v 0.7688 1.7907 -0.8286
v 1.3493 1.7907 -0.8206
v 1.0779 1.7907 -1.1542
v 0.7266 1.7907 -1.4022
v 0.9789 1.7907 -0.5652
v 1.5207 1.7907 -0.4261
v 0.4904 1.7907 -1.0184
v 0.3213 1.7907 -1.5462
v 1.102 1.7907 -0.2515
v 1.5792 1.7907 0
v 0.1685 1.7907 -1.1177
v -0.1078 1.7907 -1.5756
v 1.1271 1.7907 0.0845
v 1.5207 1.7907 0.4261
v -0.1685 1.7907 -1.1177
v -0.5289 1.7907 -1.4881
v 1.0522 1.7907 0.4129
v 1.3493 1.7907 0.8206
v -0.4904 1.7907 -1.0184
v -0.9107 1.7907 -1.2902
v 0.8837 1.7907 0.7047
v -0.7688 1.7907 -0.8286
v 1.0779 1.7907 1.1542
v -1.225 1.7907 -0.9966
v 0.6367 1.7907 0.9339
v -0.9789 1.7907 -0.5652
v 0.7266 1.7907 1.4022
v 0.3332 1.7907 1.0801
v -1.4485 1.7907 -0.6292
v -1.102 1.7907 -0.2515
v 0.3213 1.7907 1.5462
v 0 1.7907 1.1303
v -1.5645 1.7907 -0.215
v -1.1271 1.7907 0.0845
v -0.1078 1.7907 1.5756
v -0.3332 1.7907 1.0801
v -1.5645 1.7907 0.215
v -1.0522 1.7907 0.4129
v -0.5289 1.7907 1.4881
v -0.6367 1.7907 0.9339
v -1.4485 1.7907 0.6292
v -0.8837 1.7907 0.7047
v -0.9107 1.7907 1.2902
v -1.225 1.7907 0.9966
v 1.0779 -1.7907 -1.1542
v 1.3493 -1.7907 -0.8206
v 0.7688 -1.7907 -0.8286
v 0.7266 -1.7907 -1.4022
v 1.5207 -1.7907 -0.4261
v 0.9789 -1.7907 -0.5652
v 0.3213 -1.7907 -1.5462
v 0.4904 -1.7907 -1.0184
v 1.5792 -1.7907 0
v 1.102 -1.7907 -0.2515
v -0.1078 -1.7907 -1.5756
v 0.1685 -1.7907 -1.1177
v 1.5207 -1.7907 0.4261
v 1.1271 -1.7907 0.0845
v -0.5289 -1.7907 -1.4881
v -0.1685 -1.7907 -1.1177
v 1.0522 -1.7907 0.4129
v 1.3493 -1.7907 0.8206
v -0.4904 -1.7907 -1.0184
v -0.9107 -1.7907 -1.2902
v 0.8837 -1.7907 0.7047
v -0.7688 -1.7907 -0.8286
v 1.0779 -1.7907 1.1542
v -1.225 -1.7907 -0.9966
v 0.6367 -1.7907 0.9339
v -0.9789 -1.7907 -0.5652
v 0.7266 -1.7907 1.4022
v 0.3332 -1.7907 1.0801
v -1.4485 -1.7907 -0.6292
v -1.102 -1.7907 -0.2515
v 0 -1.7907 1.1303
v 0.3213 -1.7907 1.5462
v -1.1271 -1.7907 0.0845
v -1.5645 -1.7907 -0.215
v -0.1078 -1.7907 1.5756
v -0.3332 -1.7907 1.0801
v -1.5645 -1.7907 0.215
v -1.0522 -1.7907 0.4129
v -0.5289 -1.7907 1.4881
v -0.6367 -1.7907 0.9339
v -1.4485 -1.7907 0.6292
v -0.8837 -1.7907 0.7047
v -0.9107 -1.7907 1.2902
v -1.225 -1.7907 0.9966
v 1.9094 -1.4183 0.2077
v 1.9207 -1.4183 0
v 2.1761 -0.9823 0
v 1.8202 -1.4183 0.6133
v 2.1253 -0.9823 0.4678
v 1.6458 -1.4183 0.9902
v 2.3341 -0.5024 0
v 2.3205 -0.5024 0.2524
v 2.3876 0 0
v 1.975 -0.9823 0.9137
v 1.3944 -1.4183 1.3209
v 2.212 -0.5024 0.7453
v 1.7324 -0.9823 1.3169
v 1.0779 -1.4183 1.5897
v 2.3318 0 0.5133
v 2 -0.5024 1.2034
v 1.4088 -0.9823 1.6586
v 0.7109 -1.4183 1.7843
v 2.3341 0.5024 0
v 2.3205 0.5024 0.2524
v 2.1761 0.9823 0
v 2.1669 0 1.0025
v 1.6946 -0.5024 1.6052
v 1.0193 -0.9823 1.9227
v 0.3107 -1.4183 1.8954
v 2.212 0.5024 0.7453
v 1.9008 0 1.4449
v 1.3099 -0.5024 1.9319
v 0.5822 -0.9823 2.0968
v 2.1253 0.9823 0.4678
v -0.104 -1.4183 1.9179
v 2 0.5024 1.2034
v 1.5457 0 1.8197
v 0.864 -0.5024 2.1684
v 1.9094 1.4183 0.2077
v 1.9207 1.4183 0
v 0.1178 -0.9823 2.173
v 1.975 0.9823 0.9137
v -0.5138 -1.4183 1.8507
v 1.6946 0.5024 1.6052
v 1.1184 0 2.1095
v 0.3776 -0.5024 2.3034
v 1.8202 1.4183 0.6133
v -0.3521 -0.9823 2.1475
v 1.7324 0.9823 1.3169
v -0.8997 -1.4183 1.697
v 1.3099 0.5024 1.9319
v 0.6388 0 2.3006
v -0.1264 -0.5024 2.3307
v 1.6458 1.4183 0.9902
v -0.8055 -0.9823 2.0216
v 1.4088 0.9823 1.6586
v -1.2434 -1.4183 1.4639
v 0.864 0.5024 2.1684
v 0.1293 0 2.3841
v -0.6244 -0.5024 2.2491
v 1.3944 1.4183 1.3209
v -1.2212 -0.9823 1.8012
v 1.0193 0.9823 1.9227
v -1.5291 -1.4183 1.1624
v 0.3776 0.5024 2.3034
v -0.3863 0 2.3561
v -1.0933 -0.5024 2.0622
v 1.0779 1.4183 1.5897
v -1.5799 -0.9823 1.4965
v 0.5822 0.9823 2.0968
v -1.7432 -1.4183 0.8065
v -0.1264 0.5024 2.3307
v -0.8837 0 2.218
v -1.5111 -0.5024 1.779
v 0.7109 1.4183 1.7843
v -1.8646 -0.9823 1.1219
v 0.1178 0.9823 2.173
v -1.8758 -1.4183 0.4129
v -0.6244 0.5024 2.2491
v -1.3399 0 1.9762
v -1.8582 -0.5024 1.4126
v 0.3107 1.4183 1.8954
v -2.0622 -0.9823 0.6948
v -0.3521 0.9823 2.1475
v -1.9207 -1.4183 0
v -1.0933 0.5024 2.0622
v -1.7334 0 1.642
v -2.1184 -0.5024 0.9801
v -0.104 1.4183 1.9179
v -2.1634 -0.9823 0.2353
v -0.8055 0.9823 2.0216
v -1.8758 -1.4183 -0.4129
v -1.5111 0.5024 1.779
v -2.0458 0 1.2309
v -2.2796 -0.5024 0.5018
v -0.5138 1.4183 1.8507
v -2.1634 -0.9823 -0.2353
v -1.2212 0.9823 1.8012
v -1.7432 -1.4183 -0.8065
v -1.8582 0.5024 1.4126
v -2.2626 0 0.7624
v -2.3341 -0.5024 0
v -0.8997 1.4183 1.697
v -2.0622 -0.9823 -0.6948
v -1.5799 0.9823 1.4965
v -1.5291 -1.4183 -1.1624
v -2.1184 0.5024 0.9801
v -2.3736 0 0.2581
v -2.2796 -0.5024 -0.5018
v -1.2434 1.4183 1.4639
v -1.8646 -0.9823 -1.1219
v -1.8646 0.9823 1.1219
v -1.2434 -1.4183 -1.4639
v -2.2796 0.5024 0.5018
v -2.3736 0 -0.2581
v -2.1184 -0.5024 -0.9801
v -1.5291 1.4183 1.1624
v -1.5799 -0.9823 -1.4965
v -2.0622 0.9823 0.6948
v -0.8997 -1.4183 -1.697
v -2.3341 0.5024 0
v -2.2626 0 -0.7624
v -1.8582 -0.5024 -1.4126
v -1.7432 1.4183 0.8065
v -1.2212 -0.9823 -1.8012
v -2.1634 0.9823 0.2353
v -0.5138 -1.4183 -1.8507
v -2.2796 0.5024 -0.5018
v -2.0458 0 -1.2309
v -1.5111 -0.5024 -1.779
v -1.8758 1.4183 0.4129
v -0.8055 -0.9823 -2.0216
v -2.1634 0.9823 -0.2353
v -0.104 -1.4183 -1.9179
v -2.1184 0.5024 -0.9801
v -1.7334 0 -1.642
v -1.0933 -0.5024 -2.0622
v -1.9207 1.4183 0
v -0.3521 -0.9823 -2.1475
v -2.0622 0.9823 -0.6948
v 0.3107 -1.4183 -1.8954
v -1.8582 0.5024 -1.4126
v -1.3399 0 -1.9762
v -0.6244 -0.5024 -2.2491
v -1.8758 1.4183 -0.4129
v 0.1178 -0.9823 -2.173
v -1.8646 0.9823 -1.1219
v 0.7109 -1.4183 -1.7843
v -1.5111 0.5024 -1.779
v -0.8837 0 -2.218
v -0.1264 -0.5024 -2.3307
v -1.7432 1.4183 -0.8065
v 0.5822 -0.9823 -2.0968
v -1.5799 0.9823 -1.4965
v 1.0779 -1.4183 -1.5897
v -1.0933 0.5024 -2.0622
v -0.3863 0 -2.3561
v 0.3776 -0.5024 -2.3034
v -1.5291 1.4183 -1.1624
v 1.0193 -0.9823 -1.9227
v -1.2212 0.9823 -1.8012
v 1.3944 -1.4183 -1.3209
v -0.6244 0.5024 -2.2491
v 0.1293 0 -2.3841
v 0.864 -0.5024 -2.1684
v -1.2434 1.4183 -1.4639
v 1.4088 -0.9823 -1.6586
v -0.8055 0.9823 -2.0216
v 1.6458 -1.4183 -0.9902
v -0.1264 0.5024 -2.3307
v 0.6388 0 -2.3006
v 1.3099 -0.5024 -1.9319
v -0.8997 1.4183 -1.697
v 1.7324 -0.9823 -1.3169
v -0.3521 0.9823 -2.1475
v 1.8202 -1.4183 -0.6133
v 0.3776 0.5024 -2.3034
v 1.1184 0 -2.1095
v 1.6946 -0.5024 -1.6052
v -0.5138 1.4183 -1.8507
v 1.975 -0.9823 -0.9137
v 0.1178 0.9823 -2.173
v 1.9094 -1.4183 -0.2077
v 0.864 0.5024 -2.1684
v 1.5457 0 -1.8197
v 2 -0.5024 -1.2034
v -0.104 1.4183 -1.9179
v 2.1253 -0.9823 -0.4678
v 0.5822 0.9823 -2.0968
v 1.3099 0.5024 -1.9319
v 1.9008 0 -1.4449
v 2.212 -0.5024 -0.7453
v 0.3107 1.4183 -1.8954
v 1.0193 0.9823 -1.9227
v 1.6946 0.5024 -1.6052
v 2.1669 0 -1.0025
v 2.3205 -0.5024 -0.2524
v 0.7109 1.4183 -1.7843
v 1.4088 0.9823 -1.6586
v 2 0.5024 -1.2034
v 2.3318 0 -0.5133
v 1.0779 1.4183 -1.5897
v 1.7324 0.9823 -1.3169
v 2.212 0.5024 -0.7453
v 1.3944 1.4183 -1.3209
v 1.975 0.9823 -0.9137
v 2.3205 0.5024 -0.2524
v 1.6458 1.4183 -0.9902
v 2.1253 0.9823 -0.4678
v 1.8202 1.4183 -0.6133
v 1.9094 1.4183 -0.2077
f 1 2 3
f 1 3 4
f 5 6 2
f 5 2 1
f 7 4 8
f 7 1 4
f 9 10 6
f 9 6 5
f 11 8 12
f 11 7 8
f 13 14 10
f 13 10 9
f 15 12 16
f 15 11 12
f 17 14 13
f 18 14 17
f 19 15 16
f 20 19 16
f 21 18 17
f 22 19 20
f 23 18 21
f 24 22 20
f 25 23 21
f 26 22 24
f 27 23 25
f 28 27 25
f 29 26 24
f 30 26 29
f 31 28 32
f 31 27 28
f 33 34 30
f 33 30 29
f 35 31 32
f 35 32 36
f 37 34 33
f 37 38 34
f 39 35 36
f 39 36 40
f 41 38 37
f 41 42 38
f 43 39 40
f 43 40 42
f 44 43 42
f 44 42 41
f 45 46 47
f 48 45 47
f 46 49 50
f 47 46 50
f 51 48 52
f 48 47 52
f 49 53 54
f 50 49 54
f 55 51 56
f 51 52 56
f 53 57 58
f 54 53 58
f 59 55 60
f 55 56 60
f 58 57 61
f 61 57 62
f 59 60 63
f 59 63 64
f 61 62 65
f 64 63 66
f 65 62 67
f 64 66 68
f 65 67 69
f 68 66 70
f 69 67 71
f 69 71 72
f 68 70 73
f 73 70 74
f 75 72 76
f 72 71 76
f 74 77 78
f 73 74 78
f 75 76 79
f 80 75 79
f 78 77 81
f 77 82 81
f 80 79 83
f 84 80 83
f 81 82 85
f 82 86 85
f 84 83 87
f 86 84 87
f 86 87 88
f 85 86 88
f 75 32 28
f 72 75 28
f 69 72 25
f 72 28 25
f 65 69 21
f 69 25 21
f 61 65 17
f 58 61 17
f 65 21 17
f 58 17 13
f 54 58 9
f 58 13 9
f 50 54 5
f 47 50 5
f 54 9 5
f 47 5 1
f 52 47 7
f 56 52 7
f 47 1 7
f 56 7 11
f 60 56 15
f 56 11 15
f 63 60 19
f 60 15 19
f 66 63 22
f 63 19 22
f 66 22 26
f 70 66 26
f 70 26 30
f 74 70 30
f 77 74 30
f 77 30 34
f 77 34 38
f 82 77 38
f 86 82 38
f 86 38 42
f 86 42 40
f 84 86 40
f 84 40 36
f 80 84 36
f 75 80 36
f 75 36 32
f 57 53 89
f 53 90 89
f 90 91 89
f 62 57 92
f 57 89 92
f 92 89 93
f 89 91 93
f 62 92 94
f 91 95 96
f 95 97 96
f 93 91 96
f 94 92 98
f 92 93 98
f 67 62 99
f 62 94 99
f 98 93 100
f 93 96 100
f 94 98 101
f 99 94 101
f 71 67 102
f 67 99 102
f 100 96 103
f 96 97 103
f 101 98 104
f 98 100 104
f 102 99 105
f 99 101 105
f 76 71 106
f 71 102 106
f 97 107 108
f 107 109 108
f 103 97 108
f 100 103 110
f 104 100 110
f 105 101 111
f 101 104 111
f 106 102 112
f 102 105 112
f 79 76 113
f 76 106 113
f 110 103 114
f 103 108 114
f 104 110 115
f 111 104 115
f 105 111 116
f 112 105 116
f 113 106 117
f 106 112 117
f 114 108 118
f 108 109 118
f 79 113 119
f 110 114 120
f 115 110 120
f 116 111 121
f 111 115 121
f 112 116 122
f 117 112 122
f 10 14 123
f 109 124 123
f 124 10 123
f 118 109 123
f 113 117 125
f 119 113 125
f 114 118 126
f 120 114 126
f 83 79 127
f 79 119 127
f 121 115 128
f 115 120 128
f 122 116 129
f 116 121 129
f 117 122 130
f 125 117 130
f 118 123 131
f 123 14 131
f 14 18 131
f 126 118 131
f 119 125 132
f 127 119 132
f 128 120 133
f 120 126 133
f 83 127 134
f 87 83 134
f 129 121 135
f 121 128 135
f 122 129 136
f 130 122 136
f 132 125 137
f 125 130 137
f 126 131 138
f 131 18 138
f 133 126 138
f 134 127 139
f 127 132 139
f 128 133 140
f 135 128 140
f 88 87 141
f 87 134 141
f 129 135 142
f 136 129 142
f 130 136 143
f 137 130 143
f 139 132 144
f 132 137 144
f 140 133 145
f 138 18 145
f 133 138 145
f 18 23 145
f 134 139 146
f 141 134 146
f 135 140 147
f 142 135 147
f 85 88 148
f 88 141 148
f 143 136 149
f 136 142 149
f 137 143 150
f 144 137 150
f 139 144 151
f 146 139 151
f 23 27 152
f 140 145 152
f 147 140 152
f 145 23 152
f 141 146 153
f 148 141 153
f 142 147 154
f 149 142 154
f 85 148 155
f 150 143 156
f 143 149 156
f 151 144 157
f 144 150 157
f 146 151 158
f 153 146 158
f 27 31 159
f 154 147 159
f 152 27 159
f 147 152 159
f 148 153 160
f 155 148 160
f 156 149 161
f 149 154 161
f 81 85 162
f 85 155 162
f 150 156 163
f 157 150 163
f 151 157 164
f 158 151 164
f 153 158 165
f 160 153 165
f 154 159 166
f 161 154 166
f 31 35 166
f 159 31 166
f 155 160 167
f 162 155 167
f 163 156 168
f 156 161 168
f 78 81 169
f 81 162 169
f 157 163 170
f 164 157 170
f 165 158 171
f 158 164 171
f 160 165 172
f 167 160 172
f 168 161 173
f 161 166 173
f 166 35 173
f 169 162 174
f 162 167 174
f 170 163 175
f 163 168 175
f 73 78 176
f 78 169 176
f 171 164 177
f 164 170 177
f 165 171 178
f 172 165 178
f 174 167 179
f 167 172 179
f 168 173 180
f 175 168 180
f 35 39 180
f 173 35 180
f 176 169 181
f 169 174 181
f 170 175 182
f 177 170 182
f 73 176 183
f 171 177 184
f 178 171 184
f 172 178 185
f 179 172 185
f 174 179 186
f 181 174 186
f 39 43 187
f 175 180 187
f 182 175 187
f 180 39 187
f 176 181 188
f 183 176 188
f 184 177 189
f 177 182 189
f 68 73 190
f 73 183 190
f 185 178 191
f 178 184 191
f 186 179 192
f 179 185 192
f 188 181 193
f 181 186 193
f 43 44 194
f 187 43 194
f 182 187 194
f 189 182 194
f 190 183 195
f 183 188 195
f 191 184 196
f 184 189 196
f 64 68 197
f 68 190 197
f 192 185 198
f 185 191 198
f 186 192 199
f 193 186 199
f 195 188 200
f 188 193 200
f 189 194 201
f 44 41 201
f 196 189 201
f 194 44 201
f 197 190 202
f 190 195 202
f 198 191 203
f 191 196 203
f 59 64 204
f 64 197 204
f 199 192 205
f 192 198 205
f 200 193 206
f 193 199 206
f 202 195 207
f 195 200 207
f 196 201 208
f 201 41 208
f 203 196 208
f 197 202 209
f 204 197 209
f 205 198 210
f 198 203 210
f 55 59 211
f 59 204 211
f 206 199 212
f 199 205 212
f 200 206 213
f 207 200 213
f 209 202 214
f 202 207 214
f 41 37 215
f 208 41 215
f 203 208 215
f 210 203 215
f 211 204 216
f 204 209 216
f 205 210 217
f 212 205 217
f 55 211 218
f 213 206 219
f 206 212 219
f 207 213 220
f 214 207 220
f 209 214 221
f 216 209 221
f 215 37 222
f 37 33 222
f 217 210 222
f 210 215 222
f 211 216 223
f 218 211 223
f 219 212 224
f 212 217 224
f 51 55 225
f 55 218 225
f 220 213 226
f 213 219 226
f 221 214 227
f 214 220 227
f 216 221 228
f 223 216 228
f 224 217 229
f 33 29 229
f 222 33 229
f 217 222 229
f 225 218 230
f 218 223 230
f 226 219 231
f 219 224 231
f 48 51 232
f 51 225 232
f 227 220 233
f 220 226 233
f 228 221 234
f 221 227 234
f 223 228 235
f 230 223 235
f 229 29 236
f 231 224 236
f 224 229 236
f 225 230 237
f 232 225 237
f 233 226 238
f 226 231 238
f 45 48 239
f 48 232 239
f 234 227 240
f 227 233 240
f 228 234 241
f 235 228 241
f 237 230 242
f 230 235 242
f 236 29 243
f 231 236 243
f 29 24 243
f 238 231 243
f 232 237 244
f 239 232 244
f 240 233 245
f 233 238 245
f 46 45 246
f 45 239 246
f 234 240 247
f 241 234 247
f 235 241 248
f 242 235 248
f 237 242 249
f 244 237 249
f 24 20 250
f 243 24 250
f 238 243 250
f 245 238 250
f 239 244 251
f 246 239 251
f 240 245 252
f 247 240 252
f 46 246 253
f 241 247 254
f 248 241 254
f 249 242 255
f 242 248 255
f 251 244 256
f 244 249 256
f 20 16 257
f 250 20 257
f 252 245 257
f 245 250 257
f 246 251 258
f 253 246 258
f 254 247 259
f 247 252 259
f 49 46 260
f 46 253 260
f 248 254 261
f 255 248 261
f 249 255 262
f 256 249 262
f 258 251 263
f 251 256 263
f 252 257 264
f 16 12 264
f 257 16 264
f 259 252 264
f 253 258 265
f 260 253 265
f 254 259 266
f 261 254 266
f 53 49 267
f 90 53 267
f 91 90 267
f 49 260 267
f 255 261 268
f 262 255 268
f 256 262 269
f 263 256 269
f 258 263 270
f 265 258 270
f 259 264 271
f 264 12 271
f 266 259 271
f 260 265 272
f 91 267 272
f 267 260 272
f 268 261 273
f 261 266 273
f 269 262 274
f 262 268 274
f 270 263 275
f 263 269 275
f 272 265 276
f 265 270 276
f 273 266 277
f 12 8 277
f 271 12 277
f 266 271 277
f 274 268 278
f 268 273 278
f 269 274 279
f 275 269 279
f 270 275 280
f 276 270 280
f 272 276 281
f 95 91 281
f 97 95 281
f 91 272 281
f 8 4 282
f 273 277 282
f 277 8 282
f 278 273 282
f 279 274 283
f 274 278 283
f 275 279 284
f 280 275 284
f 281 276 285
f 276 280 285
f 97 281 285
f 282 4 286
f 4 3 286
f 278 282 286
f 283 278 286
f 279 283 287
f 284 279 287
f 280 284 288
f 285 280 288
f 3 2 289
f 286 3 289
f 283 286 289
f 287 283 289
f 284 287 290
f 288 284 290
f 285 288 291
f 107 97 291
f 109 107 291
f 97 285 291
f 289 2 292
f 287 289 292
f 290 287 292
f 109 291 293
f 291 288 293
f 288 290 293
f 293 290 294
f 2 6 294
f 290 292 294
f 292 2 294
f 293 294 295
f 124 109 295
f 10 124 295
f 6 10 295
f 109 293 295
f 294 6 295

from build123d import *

# Parameters (mm, degrees)
SKETCH2_R      = 2.3876
EXTRUDE1_DEPTH = 6.3721
SKETCH3_R      = 1.1303
EXTRUDE2_DEPTH = 5.922163496


with BuildPart() as part:
    # Sketch1 → Revolve1 (revolve)
    with BuildSketch(Plane.XY):
        with BuildLine():
            Line((0, 2.3876), (0, -2.3876))
            ThreePointArc((0, -2.3876), (2.3876, 0), (0, 2.3876))
        make_face()
    revolve(axis=Axis((0, 2.3876, 0), (0, -1, 0)))

    # Sketch2 → Extrude1 (cut, through all)
    with BuildSketch(Plane(origin=(0, 1.7907, 0), x_dir=(-1, 0, 0), z_dir=(0, 1, 0))):
        Circle(SKETCH2_R)
    extrude1 = extrude(amount=EXTRUDE1_DEPTH, mode=Mode.SUBTRACT)

    # Mirror1: Extrude1 across plane
    add(extrude1.mirror(Plane.ZX), mode=Mode.SUBTRACT)

    # Sketch3 → Extrude2 (cut, through all)
    with BuildSketch(Plane(origin=(0, 1.7907, 0), x_dir=(-1, 0, 0), z_dir=(0, 1, 0))):
        with Locations(Location((0, 0, 0), (0, 0, 90))):
            Circle(SKETCH3_R)
    extrude(amount=-EXTRUDE2_DEPTH, mode=Mode.SUBTRACT)


solid = part.part
